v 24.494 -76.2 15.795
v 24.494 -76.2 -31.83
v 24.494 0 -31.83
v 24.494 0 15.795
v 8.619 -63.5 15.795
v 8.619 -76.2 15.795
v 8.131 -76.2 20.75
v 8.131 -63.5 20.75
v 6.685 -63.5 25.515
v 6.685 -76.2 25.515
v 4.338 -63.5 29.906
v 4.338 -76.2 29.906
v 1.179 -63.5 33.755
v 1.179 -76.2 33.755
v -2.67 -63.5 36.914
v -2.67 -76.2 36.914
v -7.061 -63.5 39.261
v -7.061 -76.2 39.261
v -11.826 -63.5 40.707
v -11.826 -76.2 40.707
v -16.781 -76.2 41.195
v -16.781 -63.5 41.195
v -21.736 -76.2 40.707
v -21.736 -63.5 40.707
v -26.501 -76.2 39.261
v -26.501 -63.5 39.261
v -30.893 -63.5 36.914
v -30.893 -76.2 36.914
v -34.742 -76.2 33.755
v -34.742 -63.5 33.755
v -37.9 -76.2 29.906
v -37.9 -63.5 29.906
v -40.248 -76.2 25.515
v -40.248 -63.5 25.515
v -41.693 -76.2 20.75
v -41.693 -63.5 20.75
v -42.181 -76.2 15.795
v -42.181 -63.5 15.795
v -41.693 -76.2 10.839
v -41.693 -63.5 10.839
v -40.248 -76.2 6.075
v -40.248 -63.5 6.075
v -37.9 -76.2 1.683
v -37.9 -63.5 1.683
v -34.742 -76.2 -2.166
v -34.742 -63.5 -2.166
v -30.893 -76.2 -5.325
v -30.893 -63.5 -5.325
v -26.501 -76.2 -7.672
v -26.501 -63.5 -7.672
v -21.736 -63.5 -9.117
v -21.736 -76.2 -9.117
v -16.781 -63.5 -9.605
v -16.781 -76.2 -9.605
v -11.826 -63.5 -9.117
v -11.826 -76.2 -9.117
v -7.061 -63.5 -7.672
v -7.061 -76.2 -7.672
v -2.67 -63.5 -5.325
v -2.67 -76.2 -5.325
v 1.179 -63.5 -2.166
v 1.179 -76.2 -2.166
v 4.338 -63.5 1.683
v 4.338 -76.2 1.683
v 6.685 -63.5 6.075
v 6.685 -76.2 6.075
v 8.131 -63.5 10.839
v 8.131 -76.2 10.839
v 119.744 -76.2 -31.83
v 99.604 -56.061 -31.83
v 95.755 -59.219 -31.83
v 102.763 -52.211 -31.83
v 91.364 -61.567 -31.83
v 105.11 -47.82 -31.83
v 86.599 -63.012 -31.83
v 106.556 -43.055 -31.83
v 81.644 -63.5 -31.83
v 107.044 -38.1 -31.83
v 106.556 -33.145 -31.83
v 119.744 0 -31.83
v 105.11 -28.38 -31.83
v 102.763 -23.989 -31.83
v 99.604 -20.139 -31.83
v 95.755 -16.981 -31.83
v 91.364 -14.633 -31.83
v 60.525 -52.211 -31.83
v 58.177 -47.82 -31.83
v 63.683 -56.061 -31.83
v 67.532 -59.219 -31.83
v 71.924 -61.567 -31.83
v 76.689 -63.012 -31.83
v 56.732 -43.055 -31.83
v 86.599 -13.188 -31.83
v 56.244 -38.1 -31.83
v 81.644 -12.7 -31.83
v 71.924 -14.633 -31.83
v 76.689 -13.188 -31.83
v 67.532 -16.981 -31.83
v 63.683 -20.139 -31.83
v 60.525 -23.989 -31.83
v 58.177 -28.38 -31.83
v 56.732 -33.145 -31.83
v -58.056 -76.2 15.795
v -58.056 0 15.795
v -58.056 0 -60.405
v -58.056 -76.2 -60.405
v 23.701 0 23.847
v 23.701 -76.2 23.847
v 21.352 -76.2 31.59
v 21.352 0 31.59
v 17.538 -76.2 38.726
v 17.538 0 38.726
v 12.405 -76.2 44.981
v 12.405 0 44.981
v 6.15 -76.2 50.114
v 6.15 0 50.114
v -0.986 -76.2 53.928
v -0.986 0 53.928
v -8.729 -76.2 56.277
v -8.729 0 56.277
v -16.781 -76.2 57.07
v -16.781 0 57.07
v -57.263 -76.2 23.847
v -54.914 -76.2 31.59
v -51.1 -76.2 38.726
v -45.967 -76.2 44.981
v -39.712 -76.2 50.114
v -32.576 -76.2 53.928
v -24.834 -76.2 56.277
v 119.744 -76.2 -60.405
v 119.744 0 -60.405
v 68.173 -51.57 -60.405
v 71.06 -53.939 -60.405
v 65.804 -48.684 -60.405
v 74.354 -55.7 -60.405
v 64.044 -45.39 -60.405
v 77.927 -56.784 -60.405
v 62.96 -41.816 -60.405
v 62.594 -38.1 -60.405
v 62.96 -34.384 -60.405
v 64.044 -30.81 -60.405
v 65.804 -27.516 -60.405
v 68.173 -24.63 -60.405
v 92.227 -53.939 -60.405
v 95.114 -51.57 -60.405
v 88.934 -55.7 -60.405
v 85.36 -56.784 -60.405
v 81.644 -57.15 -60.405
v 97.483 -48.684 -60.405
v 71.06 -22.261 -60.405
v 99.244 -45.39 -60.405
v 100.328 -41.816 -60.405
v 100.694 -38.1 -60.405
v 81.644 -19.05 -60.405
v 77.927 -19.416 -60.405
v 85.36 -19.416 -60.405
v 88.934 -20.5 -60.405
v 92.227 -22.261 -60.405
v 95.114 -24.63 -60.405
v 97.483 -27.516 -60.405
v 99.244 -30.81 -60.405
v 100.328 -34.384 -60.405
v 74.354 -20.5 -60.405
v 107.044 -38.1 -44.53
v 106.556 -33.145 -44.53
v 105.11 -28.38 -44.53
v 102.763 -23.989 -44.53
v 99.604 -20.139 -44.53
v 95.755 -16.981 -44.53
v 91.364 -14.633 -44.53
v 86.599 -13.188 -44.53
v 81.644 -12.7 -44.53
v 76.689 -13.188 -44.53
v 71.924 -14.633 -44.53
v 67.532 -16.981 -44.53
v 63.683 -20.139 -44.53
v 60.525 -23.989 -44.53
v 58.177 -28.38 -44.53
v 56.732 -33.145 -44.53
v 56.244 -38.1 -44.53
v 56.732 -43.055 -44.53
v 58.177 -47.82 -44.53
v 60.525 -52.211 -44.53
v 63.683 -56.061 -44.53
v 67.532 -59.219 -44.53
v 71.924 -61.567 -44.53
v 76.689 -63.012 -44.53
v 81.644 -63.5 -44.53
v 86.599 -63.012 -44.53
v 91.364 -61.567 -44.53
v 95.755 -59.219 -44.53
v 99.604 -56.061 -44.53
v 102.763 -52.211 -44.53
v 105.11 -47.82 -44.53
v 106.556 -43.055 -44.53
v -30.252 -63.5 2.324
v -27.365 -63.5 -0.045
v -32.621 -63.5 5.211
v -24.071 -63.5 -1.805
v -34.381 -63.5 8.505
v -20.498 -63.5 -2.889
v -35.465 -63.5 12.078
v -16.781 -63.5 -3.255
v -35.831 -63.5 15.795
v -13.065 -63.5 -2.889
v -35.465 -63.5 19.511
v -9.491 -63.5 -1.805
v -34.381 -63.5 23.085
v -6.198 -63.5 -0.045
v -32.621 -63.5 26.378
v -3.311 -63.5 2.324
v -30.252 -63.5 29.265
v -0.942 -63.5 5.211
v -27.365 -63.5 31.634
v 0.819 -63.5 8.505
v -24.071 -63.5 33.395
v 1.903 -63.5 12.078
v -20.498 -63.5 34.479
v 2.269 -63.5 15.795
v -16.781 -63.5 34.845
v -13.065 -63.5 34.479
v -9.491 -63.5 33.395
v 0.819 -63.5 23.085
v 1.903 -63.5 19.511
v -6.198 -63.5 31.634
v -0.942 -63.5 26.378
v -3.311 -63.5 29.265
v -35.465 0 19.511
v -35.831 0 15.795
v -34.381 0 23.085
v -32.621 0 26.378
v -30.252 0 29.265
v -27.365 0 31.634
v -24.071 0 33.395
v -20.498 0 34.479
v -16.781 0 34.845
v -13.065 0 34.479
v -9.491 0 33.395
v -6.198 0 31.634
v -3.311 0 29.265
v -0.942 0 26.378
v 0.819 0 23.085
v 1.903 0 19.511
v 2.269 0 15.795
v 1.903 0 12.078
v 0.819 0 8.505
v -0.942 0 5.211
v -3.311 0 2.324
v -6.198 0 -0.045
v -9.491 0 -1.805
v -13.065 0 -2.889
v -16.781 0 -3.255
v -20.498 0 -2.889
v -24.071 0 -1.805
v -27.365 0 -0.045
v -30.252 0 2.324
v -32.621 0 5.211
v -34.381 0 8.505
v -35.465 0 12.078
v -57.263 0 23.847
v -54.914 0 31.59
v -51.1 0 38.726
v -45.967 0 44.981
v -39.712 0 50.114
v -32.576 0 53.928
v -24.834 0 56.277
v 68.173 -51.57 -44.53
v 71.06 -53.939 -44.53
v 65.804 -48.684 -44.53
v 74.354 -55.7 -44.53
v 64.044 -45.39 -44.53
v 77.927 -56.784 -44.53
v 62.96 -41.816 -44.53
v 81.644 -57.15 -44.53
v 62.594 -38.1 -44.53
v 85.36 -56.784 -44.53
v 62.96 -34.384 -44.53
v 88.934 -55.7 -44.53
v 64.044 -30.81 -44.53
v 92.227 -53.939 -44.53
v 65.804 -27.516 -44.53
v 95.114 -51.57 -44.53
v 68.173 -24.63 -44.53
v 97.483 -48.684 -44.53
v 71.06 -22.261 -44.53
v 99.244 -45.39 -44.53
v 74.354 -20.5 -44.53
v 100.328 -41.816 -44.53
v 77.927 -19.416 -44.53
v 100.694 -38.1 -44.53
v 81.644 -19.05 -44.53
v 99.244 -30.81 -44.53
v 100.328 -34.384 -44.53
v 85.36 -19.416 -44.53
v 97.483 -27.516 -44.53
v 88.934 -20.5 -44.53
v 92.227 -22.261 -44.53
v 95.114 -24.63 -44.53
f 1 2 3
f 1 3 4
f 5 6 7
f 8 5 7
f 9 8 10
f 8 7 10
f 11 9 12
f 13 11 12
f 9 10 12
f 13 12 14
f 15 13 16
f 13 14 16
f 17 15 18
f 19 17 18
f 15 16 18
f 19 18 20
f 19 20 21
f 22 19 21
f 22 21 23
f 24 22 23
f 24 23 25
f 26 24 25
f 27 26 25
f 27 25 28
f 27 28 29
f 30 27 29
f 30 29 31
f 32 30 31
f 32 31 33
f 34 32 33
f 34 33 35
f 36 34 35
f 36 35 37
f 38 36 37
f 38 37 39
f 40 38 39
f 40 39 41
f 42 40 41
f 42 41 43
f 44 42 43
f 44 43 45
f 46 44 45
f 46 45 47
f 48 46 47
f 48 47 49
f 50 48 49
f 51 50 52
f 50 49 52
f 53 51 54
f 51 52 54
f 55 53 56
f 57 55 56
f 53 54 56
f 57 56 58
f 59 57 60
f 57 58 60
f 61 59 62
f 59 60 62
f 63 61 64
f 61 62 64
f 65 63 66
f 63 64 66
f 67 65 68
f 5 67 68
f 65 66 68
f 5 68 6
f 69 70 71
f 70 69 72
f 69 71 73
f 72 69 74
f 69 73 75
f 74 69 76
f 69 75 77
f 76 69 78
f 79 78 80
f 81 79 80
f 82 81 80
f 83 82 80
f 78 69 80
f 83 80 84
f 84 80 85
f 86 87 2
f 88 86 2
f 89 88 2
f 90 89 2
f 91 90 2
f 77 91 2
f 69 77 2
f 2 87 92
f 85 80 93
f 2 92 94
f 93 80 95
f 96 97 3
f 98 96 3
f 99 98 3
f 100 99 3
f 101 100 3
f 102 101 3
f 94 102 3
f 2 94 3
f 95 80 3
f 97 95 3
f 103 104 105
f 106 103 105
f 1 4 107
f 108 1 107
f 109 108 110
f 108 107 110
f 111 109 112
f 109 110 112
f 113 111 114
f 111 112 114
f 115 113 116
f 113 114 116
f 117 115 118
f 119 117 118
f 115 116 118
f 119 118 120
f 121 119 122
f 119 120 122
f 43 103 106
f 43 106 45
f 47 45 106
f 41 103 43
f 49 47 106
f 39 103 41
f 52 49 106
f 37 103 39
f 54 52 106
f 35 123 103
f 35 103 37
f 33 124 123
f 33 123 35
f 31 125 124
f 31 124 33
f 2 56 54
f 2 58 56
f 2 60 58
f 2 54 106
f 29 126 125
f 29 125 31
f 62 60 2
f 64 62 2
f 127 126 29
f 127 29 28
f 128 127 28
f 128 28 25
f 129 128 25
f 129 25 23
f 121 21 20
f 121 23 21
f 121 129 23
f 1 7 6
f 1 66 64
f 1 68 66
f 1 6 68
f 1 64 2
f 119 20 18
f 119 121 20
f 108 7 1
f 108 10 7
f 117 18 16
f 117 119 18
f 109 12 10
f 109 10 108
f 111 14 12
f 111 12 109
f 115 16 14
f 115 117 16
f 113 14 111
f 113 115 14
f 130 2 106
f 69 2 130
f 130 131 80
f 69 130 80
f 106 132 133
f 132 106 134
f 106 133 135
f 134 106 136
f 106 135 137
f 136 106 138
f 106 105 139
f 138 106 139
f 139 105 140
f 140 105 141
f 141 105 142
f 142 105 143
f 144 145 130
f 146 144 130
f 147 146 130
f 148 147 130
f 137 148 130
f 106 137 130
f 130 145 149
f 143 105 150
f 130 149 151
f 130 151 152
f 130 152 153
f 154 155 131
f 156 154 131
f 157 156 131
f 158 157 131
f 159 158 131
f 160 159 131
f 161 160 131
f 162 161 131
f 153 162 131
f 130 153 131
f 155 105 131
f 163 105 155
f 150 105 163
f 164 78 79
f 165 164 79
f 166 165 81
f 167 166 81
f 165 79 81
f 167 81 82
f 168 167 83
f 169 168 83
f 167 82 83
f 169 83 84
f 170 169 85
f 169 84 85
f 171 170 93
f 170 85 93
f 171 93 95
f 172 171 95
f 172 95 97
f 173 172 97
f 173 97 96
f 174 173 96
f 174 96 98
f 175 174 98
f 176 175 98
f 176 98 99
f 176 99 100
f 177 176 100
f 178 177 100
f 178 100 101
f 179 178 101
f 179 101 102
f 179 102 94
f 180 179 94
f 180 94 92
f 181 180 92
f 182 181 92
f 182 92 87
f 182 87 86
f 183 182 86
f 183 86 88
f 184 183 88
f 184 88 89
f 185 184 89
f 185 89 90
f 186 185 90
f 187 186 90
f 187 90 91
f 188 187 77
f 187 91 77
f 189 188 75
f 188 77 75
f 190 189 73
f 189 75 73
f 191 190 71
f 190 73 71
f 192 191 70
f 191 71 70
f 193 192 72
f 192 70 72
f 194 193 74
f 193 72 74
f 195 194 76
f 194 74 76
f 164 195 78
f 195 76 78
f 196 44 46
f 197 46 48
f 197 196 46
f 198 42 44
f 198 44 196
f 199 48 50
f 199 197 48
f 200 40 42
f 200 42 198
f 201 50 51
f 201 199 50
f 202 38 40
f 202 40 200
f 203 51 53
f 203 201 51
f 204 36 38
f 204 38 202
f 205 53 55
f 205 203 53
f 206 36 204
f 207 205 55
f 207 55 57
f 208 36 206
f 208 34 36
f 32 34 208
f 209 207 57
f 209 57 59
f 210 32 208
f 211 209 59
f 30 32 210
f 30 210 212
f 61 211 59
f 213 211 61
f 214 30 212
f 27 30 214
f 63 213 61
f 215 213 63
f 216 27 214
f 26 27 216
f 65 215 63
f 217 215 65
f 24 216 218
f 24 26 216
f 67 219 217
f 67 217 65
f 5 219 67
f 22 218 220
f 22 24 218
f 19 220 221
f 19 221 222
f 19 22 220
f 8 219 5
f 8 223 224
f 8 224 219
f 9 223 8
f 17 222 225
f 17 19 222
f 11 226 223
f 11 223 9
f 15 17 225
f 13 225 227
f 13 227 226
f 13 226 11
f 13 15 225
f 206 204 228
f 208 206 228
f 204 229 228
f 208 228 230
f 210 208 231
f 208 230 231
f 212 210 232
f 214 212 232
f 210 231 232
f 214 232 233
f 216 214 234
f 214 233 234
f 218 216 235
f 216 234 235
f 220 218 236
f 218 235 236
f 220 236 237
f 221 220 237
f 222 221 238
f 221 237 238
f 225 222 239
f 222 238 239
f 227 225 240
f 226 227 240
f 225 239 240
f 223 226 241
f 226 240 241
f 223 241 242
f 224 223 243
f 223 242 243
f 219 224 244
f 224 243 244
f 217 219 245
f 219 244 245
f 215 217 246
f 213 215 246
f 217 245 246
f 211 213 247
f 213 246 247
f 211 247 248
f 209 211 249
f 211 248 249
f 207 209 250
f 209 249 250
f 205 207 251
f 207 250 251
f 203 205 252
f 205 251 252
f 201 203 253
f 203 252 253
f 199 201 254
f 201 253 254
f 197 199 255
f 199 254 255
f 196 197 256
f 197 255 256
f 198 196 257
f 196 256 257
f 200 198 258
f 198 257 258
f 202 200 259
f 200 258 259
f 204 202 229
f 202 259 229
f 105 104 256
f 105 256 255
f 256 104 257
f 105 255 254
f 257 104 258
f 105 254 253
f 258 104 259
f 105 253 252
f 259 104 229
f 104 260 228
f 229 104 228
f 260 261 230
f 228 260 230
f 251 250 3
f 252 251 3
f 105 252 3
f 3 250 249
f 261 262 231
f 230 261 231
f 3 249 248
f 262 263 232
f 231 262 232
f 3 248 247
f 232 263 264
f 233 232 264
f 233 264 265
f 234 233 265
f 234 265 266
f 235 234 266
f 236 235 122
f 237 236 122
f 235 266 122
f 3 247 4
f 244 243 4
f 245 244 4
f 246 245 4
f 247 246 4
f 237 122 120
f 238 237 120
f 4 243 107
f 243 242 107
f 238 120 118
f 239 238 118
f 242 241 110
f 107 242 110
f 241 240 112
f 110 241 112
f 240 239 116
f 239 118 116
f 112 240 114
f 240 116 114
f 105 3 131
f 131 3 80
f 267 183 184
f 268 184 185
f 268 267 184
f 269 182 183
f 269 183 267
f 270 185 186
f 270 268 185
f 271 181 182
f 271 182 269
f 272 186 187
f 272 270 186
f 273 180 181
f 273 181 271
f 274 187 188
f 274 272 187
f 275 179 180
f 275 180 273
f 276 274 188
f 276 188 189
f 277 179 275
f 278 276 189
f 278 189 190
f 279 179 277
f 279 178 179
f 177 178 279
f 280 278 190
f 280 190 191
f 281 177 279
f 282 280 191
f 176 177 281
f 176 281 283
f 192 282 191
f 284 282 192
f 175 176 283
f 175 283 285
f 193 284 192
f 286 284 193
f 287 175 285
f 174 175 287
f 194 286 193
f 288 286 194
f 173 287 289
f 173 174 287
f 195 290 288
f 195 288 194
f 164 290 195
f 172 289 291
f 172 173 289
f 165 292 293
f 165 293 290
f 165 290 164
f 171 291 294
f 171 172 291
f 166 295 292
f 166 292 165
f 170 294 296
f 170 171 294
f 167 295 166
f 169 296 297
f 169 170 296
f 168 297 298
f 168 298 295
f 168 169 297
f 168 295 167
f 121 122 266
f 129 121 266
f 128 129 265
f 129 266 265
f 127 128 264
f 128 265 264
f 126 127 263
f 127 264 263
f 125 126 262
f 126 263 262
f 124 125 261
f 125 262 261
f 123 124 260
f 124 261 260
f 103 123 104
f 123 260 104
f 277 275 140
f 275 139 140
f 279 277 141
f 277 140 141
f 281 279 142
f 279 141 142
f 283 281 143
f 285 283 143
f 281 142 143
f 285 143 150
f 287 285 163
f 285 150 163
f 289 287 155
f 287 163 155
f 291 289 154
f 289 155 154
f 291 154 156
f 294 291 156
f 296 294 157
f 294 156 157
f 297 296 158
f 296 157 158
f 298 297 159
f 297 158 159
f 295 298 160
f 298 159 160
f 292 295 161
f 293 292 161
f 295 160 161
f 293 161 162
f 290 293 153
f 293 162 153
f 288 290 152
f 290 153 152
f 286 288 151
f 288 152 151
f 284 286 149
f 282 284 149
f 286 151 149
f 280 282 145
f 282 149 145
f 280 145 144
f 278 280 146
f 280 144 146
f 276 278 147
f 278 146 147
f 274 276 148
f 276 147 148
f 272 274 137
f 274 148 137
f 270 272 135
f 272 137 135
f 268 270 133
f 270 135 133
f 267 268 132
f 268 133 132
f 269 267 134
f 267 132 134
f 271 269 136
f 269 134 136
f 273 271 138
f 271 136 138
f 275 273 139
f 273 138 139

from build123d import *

# Parameters (mm, degrees)
F1_DEPTH       = 76.2
F3_D           = 38.1
F3_CBORE_D     = 50.8
F3_CBORE_DEPTH = 12.7
F5_D           = 38.1
F5_CBORE_D     = 50.8
F5_CBORE_DEPTH = 12.7


with BuildPart() as f1:
    # F0 (on Front) → F1 (new body)
    with BuildSketch(Plane.XZ):
        with BuildLine():
            Line((-58.056168, 15.794694), (-58.056168, -60.405306))
            Line((-58.056168, -60.405306), (119.743832, -60.405306))
            Line((119.743832, -60.405306), (119.743832, -31.830306))
            Line((119.743832, -31.830306), (24.493832, -31.830306))
            Line((24.493832, -31.830306), (24.493832, 15.794694))
            ThreePointArc((24.493832, 15.794694), (12.404664, 44.980527), (-16.781168, 57.069694))
            ThreePointArc((-16.781168, 57.069694), (-45.967001, 44.980527), (-58.056168, 15.794694))
        make_face()
    extrude(amount=F1_DEPTH)

    # F3 (through all)
    with Locations(Plane.XZ.offset(76.2)):
        with Locations((-16.781168, 15.794694)):
            CounterBoreHole(F3_D / 2, F3_CBORE_D / 2, F3_CBORE_DEPTH)

    # F5 (through all)
    with Locations(Plane.XY.offset(-31.830306)):
        with Locations((81.643832, -38.1)):
            CounterBoreHole(F5_D / 2, F5_CBORE_D / 2, F5_CBORE_DEPTH)


solid = f1.part
